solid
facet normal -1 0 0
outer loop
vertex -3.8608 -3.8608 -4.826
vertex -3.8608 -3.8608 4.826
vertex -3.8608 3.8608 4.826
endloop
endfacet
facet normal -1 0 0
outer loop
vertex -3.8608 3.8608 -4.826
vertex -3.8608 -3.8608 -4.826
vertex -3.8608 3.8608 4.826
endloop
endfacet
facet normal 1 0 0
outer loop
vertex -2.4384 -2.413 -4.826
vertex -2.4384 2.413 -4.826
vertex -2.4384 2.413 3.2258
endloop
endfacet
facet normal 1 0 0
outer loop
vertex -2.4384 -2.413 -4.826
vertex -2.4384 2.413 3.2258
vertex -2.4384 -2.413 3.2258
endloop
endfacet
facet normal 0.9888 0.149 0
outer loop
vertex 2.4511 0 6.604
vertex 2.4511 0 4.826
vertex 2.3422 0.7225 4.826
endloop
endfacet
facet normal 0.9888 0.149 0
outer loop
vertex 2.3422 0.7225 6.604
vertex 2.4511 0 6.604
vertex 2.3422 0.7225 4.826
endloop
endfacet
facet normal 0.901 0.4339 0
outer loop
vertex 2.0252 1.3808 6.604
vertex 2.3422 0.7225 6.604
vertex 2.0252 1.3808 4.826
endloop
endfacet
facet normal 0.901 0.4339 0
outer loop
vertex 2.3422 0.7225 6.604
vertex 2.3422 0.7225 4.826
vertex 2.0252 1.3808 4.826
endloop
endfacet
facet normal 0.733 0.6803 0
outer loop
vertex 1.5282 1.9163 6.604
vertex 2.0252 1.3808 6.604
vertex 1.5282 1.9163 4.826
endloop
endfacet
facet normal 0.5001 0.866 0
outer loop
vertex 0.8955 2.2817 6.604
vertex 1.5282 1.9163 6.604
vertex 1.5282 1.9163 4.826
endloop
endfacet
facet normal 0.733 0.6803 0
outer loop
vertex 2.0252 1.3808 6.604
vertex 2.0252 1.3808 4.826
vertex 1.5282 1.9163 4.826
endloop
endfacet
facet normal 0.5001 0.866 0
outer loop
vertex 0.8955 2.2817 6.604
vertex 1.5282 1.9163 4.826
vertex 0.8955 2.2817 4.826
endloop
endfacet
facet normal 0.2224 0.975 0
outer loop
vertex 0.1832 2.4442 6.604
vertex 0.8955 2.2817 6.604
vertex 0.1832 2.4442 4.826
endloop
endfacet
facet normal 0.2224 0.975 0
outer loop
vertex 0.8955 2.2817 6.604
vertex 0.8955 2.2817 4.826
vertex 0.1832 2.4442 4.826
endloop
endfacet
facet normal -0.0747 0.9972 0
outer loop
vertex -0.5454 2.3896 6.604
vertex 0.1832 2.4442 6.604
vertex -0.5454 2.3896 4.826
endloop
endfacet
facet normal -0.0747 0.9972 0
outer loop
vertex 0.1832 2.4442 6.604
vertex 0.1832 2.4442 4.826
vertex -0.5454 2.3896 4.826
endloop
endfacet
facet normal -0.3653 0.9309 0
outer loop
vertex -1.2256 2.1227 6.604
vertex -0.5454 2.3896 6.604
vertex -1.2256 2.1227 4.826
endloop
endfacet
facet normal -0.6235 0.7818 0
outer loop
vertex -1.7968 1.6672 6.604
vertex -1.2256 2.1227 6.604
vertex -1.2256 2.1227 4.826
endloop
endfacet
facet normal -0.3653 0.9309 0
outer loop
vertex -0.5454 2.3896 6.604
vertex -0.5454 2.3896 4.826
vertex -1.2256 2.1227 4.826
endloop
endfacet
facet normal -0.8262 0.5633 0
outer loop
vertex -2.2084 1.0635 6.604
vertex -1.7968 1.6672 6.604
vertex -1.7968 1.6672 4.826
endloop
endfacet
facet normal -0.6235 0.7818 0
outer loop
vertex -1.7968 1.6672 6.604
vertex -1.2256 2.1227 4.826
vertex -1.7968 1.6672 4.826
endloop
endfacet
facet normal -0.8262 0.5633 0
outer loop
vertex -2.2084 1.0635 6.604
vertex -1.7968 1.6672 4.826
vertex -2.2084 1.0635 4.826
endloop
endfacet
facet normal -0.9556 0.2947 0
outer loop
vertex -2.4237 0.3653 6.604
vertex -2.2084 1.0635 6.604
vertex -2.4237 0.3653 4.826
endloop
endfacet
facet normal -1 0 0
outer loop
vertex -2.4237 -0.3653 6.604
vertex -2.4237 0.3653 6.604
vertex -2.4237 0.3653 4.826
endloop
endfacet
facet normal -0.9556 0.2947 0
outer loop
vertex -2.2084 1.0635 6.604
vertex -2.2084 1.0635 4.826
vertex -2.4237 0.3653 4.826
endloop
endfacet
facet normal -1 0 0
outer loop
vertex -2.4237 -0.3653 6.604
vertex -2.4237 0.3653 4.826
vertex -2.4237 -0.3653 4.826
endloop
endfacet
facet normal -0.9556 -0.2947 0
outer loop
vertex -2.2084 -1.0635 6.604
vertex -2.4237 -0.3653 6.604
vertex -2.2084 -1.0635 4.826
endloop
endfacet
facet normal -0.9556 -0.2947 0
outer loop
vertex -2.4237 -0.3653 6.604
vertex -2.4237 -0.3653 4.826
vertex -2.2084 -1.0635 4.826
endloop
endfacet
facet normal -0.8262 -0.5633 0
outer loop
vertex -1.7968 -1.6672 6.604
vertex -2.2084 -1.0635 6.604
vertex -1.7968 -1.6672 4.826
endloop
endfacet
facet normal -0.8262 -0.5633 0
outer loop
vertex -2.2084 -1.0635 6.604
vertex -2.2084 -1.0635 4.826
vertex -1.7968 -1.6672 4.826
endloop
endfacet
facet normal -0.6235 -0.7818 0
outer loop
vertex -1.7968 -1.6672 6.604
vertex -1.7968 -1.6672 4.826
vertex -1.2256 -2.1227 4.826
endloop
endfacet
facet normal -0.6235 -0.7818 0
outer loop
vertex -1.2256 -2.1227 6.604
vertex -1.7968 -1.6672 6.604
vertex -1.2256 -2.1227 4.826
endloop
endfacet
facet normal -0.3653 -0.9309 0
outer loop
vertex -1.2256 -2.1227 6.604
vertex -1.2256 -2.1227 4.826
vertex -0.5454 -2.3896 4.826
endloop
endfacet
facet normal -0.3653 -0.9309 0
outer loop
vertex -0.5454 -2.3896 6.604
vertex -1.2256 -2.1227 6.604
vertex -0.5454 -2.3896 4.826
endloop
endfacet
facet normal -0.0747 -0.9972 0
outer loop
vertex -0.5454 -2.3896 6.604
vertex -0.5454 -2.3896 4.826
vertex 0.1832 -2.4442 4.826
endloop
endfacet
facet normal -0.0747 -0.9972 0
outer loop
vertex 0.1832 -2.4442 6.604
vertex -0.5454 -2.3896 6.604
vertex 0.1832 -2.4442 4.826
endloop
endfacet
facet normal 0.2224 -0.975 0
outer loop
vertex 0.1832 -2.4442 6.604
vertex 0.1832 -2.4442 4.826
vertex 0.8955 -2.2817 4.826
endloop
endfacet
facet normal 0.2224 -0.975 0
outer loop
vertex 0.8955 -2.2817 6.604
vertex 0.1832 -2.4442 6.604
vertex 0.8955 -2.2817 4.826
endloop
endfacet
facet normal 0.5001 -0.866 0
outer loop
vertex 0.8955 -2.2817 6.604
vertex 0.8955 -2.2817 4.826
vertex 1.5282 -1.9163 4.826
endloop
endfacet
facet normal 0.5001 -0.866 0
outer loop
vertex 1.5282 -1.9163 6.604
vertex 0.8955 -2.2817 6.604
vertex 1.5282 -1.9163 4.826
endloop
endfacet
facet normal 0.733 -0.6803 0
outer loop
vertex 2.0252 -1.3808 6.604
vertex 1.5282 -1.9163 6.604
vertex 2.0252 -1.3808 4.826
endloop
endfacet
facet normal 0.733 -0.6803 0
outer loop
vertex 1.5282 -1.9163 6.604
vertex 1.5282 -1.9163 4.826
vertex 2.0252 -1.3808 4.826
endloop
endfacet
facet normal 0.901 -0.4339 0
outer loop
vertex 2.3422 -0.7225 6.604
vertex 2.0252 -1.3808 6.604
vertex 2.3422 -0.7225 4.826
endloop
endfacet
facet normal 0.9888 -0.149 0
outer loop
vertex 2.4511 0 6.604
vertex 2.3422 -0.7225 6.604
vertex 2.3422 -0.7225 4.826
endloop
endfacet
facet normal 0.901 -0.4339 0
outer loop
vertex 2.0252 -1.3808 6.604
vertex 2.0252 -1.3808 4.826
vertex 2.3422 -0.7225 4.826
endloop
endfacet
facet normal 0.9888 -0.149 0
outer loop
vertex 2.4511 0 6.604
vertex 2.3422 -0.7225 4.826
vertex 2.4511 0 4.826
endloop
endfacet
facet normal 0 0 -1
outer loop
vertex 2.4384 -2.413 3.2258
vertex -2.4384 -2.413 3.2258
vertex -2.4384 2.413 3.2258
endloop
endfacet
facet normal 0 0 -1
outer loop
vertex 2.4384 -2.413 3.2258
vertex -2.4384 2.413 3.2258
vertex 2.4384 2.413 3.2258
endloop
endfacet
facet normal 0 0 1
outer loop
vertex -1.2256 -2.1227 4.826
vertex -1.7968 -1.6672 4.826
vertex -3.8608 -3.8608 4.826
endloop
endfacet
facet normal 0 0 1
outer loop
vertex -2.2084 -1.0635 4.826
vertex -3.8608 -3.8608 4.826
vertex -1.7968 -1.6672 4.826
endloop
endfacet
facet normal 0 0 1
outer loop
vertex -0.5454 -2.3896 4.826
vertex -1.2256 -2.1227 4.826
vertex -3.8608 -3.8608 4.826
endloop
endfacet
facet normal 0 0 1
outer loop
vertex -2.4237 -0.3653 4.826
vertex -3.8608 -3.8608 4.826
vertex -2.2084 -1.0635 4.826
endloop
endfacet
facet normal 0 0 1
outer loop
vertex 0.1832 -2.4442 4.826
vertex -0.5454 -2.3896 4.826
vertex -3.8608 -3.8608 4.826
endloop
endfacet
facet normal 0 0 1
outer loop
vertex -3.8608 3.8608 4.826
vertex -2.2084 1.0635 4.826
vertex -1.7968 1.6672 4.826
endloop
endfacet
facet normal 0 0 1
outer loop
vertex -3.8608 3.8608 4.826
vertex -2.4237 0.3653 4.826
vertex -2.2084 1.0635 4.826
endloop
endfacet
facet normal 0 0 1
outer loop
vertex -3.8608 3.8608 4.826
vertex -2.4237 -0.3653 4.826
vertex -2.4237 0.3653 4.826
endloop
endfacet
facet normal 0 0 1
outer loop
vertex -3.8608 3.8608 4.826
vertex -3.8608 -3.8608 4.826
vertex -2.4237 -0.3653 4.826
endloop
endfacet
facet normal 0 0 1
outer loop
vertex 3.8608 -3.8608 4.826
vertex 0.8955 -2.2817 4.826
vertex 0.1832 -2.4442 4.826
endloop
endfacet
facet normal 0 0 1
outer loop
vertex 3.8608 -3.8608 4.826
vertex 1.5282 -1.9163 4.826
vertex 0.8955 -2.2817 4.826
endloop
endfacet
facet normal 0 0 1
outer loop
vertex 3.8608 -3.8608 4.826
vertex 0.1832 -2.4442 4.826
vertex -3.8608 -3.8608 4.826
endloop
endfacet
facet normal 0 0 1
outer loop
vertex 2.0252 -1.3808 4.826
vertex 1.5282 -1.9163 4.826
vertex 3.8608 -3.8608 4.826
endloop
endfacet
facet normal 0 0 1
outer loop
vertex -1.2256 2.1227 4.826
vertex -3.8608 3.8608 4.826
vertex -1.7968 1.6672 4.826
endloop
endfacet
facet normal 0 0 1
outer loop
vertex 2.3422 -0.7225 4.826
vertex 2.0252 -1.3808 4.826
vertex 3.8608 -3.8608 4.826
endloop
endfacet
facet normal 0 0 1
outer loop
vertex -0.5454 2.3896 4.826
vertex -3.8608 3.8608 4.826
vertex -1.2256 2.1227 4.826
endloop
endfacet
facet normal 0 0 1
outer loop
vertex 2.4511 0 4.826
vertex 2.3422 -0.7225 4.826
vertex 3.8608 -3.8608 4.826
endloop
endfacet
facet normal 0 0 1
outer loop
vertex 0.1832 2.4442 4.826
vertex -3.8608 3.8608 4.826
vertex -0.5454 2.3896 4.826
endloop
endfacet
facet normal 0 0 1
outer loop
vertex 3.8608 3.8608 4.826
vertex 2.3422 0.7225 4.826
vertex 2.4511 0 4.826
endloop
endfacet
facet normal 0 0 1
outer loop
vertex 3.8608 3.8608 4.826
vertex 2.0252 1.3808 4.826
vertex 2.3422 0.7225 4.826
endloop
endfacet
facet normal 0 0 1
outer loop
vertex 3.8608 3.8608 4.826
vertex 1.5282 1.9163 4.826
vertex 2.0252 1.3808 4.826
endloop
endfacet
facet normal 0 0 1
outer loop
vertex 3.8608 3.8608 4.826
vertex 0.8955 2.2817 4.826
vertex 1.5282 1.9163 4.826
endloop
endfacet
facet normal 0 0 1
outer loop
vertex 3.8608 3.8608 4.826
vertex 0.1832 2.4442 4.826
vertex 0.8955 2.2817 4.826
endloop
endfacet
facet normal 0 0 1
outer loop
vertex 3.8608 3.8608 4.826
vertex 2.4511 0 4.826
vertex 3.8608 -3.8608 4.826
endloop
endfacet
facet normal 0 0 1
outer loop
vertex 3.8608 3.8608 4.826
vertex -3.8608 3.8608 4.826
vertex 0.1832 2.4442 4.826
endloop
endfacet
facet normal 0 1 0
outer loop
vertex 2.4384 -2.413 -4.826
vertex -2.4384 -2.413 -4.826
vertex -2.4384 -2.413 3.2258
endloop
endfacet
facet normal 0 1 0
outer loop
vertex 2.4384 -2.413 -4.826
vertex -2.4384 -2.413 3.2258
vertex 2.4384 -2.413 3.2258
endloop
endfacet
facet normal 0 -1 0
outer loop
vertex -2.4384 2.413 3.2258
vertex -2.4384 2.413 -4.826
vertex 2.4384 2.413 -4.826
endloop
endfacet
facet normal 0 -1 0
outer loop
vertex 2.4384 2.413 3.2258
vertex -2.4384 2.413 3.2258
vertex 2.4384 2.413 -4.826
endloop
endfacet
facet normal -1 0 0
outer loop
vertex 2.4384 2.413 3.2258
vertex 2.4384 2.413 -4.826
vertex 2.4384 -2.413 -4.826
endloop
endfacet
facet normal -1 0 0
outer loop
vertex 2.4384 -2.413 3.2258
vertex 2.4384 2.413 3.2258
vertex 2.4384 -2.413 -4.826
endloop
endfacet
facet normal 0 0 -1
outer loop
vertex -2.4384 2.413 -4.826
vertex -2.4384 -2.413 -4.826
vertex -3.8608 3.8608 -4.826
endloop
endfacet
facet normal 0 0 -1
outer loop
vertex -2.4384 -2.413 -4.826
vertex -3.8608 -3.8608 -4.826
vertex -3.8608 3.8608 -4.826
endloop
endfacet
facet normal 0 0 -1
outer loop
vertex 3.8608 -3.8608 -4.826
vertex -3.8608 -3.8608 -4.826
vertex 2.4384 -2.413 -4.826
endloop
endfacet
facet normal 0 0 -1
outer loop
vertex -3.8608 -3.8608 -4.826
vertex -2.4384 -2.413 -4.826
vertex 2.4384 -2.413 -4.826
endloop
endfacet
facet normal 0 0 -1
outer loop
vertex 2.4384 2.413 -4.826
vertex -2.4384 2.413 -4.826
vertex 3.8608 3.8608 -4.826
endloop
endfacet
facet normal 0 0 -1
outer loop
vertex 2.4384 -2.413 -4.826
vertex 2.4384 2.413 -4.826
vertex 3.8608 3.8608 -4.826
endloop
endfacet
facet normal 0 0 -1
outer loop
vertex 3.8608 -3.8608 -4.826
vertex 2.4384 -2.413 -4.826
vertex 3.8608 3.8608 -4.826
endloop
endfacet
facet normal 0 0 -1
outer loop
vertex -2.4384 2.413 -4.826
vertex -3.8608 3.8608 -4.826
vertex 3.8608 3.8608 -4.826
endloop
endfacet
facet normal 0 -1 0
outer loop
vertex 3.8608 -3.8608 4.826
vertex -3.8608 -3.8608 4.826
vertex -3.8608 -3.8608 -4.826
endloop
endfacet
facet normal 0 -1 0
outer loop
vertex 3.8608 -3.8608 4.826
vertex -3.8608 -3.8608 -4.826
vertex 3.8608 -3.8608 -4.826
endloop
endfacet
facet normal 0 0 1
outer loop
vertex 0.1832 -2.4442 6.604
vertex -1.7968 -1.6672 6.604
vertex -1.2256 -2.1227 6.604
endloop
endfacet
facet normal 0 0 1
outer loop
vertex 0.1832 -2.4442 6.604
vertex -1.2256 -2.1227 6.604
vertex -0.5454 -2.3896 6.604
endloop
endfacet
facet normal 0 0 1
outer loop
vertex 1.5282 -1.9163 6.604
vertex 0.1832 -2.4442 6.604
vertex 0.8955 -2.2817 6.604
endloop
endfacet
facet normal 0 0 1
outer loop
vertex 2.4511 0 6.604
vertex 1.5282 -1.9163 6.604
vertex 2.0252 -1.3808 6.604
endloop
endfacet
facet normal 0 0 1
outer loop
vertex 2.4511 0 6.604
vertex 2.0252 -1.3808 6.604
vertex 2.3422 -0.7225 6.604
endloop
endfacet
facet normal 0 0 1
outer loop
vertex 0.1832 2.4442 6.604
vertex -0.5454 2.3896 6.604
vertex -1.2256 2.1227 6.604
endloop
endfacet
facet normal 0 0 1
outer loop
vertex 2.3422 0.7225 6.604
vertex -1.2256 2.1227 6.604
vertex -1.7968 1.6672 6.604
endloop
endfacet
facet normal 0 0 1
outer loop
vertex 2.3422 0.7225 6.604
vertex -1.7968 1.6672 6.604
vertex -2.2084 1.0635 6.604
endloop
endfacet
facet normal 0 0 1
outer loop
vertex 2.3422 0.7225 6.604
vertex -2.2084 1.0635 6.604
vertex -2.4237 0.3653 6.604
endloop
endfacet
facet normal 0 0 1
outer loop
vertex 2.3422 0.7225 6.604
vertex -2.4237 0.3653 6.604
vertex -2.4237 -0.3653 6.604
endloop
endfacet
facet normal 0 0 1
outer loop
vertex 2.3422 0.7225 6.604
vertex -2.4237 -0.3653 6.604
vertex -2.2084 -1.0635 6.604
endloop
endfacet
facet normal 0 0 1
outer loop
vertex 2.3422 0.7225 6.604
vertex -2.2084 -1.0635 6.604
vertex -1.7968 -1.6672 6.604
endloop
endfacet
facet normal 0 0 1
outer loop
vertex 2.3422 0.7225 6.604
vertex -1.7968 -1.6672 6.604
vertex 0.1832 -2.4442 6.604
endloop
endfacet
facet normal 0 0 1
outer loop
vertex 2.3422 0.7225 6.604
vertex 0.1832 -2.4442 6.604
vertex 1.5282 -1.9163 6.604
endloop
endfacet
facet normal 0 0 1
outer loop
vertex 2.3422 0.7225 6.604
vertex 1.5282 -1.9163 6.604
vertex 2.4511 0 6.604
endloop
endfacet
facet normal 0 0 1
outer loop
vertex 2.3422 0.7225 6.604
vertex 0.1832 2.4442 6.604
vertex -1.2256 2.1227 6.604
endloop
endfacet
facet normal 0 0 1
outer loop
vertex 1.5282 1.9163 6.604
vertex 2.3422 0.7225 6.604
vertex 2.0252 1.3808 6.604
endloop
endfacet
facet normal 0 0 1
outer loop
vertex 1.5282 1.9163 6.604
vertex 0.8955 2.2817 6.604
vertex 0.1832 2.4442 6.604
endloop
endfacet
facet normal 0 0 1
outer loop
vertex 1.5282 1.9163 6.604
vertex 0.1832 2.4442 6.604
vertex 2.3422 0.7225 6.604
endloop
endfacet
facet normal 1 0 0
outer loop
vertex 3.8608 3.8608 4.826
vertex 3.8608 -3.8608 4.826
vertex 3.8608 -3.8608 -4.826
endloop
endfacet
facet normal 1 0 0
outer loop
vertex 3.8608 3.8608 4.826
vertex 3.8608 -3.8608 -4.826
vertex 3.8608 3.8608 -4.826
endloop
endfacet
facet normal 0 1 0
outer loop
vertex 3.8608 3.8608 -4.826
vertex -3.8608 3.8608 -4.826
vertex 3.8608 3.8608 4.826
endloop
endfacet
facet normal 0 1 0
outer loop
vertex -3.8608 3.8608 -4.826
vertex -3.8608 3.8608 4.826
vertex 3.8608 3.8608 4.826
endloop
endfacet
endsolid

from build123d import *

# Parameters (mm, degrees)
F0_W     = 7.7216
F0_H     = 7.7216
F1_DEPTH = 4.826
F2_R     = 2.4511
F3_DEPTH = 1.778
F4_W     = 4.8768
F4_H     = 4.826
F5_DEPTH = 8.0518


with BuildPart() as f1:
    # F0 (on Top) → F1 (new body, symmetric)
    with BuildSketch(Plane.XY):
        Rectangle(F0_W, F0_H)
    extrude(amount=F1_DEPTH, both=True)

    # F2 (on face) → F3 (join)
    with BuildSketch(Plane.XY.offset(4.826)):
        Circle(F2_R)
    extrude(amount=F3_DEPTH)

    # F4 (on face) → F5 (cut)
    with BuildSketch(Plane(origin=(0, 0, -4.826), x_dir=(1, 0, 0), z_dir=(0, 0, -1))):
        Rectangle(F4_W, F4_H)
    extrude(amount=-F5_DEPTH, mode=Mode.SUBTRACT)


solid = f1.part
